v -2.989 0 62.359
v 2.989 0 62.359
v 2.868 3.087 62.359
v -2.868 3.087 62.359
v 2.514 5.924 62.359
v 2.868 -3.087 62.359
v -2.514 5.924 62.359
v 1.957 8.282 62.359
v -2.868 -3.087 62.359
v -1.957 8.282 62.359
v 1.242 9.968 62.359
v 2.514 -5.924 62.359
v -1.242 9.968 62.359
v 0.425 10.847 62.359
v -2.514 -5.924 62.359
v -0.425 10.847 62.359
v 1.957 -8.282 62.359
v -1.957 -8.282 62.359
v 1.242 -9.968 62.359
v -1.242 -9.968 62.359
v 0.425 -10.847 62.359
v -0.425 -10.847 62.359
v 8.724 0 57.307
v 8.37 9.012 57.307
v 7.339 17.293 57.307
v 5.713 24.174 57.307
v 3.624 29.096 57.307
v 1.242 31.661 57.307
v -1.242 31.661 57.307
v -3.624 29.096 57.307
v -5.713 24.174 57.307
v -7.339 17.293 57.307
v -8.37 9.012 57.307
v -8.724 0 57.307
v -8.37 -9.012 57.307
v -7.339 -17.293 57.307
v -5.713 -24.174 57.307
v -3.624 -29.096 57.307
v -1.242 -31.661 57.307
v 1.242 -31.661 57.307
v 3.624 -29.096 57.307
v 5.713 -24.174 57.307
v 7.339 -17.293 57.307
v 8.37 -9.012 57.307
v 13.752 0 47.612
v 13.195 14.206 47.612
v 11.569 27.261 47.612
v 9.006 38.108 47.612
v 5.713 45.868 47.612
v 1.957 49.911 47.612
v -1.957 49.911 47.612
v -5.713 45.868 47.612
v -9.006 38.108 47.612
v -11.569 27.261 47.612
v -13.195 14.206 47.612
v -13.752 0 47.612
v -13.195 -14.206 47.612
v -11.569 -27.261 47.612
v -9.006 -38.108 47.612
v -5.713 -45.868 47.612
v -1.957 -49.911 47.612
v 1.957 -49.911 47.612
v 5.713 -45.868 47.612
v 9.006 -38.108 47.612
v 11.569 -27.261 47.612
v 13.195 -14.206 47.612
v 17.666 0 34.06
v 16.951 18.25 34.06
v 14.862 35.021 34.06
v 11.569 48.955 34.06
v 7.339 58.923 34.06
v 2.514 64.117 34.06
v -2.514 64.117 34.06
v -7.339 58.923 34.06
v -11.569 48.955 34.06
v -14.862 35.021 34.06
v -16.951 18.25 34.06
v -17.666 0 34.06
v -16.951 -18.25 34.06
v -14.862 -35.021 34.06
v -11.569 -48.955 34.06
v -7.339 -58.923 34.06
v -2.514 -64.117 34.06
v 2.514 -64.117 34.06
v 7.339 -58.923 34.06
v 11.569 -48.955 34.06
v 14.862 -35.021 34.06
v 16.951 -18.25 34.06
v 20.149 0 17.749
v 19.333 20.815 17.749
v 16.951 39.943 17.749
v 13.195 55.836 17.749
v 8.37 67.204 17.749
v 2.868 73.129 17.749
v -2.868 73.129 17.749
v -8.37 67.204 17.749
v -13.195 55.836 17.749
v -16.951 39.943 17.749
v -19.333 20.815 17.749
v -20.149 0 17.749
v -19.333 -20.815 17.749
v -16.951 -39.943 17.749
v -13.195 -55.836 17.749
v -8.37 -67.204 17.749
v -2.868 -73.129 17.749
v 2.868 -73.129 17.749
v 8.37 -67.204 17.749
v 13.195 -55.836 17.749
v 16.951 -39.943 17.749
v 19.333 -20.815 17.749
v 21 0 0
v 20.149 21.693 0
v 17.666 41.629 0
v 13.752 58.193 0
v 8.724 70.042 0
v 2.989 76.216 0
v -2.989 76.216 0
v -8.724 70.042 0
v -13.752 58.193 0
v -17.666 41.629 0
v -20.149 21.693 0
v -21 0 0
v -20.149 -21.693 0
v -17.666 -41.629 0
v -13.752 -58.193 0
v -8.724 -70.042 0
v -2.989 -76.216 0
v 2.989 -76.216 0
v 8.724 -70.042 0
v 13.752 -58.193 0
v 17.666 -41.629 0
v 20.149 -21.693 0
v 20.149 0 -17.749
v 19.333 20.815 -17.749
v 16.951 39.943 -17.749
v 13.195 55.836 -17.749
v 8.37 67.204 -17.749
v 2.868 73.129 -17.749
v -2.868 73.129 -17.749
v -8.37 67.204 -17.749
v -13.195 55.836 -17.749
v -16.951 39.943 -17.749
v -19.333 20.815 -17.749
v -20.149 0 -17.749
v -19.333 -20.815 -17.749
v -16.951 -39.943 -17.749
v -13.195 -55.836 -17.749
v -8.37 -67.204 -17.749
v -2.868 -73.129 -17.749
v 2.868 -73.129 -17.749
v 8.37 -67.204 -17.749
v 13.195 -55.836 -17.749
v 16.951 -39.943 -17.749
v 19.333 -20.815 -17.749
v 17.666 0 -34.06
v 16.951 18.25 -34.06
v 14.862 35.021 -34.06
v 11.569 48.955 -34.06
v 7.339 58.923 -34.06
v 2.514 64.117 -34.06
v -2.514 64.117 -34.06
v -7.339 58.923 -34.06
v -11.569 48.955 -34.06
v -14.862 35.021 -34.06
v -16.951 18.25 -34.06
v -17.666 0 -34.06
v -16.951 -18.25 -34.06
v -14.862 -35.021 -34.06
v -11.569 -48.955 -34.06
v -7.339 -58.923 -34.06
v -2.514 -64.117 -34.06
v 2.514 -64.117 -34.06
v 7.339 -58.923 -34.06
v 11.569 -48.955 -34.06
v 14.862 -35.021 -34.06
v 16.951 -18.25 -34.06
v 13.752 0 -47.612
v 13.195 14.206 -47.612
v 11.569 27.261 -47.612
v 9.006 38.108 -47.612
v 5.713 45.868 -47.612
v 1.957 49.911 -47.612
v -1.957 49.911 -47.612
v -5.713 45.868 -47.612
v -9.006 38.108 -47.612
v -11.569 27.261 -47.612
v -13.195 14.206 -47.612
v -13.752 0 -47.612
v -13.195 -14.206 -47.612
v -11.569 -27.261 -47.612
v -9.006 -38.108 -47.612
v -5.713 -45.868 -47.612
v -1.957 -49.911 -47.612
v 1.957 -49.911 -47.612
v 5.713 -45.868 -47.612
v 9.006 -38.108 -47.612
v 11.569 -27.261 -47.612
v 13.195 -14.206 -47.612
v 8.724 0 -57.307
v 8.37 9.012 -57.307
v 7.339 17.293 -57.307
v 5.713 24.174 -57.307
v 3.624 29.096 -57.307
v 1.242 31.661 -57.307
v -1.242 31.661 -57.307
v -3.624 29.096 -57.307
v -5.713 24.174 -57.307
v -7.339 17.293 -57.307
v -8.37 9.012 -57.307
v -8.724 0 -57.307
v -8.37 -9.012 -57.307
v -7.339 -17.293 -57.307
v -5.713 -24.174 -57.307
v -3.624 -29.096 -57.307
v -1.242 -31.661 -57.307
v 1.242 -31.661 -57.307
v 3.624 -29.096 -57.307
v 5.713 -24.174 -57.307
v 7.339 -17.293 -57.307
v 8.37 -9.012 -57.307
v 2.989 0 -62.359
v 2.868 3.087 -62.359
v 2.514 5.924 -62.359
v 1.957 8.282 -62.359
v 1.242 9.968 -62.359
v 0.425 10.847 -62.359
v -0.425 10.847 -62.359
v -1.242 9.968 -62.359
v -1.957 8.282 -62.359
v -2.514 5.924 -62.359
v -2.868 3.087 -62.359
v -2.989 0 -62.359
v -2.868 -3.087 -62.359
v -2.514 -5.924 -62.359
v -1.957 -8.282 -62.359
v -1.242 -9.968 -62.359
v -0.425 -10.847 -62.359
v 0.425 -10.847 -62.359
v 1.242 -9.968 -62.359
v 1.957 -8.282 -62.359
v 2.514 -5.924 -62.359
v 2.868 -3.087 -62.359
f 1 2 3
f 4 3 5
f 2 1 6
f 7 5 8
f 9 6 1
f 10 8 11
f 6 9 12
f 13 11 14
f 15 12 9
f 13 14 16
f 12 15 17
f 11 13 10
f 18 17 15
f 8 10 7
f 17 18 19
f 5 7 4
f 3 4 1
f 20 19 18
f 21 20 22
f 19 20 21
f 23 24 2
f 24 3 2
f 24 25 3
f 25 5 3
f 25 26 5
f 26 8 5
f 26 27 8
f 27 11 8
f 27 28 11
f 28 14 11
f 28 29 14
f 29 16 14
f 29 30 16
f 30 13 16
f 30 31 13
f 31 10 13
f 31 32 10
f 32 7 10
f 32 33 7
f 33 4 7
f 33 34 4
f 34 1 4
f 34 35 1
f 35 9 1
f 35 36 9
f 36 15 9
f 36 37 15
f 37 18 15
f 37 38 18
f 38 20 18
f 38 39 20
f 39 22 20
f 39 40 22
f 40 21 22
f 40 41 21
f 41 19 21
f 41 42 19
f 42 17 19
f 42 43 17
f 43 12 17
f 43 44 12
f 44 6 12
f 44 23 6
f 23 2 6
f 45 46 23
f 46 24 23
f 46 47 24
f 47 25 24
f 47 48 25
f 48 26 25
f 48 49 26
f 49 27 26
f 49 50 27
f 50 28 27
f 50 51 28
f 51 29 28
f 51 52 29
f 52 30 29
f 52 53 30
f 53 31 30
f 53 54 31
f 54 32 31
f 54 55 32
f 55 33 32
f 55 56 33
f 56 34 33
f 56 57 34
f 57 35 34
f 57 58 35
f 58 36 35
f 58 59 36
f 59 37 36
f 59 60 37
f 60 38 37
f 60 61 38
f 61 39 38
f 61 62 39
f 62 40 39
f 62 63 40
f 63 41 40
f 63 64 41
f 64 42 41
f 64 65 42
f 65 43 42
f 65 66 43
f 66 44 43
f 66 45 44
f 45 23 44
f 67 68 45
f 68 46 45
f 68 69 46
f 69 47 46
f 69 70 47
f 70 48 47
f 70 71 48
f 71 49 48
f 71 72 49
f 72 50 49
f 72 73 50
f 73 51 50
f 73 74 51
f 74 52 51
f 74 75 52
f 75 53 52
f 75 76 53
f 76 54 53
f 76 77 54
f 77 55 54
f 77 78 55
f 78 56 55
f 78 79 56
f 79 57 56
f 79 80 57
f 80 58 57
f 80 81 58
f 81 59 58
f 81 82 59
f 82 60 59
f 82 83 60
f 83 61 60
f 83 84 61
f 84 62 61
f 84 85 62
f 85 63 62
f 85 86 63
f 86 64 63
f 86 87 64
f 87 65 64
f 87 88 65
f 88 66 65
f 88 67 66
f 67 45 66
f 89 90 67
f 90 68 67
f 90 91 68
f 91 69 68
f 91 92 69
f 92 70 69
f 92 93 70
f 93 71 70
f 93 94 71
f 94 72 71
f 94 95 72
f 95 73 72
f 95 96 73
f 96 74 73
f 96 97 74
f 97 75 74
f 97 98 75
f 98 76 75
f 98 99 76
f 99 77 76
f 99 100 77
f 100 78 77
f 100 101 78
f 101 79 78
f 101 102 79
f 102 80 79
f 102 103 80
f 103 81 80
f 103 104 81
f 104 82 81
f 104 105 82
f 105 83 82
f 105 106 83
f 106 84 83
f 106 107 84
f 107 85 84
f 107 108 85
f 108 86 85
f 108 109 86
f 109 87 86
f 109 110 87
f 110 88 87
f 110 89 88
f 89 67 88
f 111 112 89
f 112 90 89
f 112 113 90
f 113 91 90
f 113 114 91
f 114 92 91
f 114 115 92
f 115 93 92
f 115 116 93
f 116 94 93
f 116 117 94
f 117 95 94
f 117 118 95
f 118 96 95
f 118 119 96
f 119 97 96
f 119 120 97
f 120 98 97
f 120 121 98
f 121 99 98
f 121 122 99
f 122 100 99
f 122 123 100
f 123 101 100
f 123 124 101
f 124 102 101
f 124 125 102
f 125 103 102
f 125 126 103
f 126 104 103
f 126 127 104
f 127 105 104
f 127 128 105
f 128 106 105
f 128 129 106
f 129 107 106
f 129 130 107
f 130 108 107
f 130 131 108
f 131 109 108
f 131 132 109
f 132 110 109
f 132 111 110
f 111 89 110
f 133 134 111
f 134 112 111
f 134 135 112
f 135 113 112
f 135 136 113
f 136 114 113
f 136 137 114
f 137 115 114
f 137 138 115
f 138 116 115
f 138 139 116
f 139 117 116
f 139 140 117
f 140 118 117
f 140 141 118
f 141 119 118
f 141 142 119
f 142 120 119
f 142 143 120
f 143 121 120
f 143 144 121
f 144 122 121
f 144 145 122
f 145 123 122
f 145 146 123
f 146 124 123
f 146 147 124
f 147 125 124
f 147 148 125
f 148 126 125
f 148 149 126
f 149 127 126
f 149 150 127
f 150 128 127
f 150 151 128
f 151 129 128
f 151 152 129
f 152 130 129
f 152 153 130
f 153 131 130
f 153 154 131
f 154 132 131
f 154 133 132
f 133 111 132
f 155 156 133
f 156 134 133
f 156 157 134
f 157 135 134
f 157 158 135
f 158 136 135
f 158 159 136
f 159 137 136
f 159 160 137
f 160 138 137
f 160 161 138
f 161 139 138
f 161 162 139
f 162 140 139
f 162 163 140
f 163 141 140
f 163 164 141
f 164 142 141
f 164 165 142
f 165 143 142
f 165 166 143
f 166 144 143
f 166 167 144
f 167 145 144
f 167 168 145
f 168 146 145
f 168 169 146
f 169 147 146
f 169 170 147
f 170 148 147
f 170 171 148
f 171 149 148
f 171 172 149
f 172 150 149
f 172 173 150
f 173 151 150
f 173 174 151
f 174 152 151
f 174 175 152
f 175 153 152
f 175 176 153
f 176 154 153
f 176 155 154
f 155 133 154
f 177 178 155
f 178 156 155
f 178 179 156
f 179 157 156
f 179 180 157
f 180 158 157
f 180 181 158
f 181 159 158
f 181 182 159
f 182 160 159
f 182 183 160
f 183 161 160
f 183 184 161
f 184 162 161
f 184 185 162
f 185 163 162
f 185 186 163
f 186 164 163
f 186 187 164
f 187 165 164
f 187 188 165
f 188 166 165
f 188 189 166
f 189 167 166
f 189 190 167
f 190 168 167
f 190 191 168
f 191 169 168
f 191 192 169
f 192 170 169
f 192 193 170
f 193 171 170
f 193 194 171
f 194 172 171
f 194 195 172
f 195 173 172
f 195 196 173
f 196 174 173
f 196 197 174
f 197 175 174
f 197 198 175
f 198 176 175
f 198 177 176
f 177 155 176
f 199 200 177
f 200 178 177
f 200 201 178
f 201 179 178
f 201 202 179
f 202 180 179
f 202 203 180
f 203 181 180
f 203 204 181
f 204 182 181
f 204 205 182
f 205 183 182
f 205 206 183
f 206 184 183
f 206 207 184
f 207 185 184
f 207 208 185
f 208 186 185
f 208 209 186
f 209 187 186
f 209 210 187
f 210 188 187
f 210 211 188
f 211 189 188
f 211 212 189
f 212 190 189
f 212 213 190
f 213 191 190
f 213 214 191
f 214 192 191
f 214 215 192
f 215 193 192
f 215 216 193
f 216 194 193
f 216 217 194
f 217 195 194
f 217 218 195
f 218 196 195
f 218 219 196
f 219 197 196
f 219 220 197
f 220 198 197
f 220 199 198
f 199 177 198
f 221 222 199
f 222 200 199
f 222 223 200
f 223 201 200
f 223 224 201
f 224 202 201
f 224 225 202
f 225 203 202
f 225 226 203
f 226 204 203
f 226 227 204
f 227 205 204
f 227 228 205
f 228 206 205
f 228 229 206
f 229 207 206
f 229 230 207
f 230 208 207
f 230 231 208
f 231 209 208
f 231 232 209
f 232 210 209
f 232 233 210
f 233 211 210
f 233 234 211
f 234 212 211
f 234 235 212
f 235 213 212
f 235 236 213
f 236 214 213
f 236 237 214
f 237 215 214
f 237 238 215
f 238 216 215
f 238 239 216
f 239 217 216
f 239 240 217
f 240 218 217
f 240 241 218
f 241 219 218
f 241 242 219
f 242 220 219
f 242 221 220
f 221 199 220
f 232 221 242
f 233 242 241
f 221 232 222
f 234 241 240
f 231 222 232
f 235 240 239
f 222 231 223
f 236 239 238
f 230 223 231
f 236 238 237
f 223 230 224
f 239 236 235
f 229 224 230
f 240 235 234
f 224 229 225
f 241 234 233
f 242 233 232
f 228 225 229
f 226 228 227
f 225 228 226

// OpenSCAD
// Generated by SolidPython 1.0.1 on 2020-07-29 00:46:45


scale(v = [3, 11, 9]) {
	sphere(r = 7);
}
/***********************************************
*********      SolidPython code:      **********
************************************************
 
# import packages: SolidPython
from solid import *
from solid.utils import *
from itertools import chain, combinations, permutations


class Resize:

    def __init__(self, scad_file):
        self.scad_file = scad_file
        #self.scad_file = import_scad(scad_file)
        # cone/cylinder param:
        self.r1 = 0
        self.r2 = 0
        self.h = 0
        # rectangular prism param:
        self.w = 0
        self.l = 0
        # ellipse param:
        self.r = 0

    # import OpenScad code (file name corresponds to shape)


    # classify shape + parameters
    def assign(self, param1, param2, param3):
        if self.scad_file == 'cone.scad':
            self.r1 = param1
            self.r2 = param2
            self.h = param3
        elif self.scad_file == 'cylinder.scad':
            self.r1 = param1
            self.r2 = param2
            self.h = param3
        elif self.scad_file == 'rectangularPrism.scad':
            self.h = param1
            self.l = param2
            self.w = param3
        else:
            self.r = param1
            self.h = param2

    # resize parameters
    def iterate(self):
        x = range(3, 20, 2)
        i = 1
        if self.scad_file == 'cone.scad':
            tempList = list(permutations(x, 2))
            for temp in tempList:
                param1 = temp[0]
                param2 = temp[1]
                filepath = 'produced_scad_files/' + 'cone' + str(param1) + '_' + str(param2) + '_' + '.scad'
                scad_render_to_file(cylinder(h=param1, r1=param2, r2=0), filepath)

        elif self.scad_file == 'cylinder.scad':
            tempList = list(permutations(x, 3))
            for temp in tempList:
                param1 = temp[0]
                param2 = temp[1]
                filepath = 'produced_scad_files/' + 'cylinder' + str(param1) + '_' + str(param2) + '_' + '.scad'
                scad_render_to_file(cylinder(h=param1, r1=param2, r2=param2), filepath)

        elif self.scad_file == 'rectangularPrism.scad':
            tempList = list(permutations(x, 3))
            for temp in tempList:
                param1 = temp[0]
                param2 = temp[1]
                param3 = temp[2]
                filepath = 'produced_scad_files/' + 'rectangularPrism' + str(param1) + '_' + str(param2) + '_' + str(
                    param3) + '.scad'
                scad_render_to_file(cube(size=(param1, param2, param3)), filepath)

        elif self.scad_file == 'ellipse.scad':
            tempList = list(permutations(x, 4))
            for temp in tempList:
                param1 = temp[0]
                param2 = temp[1]
                param3 = temp[2]
                param4 = temp[3]
                filepath = 'produced_scad_files/' + 'ellipse' + str(param1) + '_' + str(param2) + '_' + str(param3) + '_' + str(param4) + '.scad'
                scad_render_to_file(scale([param1, param2, param3])(sphere(r=param4)), filepath)

    def render_to_scadfile(self):
        scad_render_to_file(scad, 'example.scad') 
 
************************************************/
